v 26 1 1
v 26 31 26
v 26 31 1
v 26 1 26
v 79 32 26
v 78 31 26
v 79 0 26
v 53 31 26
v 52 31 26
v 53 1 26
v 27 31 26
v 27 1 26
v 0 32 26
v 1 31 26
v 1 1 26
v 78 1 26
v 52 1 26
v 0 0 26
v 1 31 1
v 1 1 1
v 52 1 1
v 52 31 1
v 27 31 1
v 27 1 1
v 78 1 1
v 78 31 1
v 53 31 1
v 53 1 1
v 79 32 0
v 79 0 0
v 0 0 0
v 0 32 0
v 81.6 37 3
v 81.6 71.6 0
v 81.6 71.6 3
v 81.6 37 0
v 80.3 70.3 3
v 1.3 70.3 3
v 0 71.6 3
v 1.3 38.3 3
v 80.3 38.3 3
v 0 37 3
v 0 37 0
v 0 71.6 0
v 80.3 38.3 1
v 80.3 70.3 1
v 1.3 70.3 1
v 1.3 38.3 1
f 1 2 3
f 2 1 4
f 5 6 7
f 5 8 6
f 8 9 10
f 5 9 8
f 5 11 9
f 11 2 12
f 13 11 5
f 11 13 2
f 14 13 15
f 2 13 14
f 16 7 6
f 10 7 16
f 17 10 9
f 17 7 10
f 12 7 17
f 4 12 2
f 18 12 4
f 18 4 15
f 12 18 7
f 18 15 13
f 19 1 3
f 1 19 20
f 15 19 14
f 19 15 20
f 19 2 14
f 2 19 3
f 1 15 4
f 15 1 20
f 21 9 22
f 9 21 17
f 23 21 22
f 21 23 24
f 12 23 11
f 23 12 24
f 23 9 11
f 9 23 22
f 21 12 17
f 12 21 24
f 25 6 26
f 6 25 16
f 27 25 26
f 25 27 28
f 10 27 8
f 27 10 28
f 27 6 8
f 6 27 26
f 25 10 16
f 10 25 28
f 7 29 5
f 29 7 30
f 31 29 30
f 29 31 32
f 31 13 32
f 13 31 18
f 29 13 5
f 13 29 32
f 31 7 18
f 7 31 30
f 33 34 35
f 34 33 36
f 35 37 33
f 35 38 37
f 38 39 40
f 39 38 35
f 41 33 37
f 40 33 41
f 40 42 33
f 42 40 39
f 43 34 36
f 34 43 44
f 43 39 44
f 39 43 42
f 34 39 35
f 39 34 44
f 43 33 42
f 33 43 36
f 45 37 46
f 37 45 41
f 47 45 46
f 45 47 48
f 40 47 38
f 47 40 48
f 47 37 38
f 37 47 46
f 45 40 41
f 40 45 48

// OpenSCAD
/* 
    Simple Parametric Storage Box by dector (https://www.thingiverse.com/thing:3177524)

    This version is optimized for Thingiverse Customizer.
    For full sources and latest version checkout github repository:

    https://github.com/dector/things/tree/master/StorageBox
*/

cellSize = [25, 30, 25];
cellsCount = [3, 1];

innerThickness = 1;
outerThickness = 1;
coverThickness = 1;
bottomThickness = 1;

coverOverlap = 2;
coverGap = 0.3;

$fa = 1;
$fs = 0.2;

// Utils

function boxXSize(count, size, innerThickness, outerThickness) = count * (size + innerThickness) - innerThickness + 2 * outerThickness;

function boxYSize(count, size, innerThickness, outerThickness) = count * (size + innerThickness) - innerThickness + 2 * outerThickness;

function boxZSize(size, bottomThickness) = bottomThickness + size;

module StorageBox(cellsCount, cellSize, innerThickness = innerThickness, outerThickness = outerThickness, bottomThickness = bottomThickness) {
    
    boxSize = [
        boxXSize(cellsCount.x, cellSize.x, innerThickness, outerThickness),
        boxYSize(cellsCount.y, cellSize.y, innerThickness, outerThickness),
        boxZSize(cellSize.z, bottomThickness)
    ];

    difference() {
        cube(boxSize);    // Outer bound

        union() {
            for (i = [1:cellsCount.x]) {
                for (j = [1:cellsCount.y]) {
                    x = outerThickness + (i-1) * (cellSize.x + innerThickness);
                    y = outerThickness + (j-1) * (cellSize.y + innerThickness);
                    z = bottomThickness;

                    translate([x, y, z]) cube([cellSize.x, cellSize.y, cellSize.z]);    // Cell
                }
            }
        }
    }
}

module Cover(boxSize, overlap = coverOverlap, gap = coverGap, thickness = coverThickness) {
    
    coverSize = [
        boxSize.x + 2*coverThickness + 2*coverGap,
        boxSize.y + 2*coverThickness + 2*coverGap,
        coverThickness + coverOverlap        
    ];

    difference() {
        cube(coverSize);
        translate([thickness + gap, thickness + gap, thickness]) cube([boxSize.x, boxSize.y, coverOverlap]);
    }
}

// StorageBox
{
    StorageBox(cellsCount, cellSize);
}

// Cover
boxYSize = boxYSize(cellsCount.y, cellSize.y, innerThickness, outerThickness);
translate([0, boxYSize + 5, 0]) {
    boxSize = [
        boxXSize(cellsCount.x, cellSize.x, innerThickness, outerThickness),
        boxYSize
    ];
    Cover(boxSize);
}
